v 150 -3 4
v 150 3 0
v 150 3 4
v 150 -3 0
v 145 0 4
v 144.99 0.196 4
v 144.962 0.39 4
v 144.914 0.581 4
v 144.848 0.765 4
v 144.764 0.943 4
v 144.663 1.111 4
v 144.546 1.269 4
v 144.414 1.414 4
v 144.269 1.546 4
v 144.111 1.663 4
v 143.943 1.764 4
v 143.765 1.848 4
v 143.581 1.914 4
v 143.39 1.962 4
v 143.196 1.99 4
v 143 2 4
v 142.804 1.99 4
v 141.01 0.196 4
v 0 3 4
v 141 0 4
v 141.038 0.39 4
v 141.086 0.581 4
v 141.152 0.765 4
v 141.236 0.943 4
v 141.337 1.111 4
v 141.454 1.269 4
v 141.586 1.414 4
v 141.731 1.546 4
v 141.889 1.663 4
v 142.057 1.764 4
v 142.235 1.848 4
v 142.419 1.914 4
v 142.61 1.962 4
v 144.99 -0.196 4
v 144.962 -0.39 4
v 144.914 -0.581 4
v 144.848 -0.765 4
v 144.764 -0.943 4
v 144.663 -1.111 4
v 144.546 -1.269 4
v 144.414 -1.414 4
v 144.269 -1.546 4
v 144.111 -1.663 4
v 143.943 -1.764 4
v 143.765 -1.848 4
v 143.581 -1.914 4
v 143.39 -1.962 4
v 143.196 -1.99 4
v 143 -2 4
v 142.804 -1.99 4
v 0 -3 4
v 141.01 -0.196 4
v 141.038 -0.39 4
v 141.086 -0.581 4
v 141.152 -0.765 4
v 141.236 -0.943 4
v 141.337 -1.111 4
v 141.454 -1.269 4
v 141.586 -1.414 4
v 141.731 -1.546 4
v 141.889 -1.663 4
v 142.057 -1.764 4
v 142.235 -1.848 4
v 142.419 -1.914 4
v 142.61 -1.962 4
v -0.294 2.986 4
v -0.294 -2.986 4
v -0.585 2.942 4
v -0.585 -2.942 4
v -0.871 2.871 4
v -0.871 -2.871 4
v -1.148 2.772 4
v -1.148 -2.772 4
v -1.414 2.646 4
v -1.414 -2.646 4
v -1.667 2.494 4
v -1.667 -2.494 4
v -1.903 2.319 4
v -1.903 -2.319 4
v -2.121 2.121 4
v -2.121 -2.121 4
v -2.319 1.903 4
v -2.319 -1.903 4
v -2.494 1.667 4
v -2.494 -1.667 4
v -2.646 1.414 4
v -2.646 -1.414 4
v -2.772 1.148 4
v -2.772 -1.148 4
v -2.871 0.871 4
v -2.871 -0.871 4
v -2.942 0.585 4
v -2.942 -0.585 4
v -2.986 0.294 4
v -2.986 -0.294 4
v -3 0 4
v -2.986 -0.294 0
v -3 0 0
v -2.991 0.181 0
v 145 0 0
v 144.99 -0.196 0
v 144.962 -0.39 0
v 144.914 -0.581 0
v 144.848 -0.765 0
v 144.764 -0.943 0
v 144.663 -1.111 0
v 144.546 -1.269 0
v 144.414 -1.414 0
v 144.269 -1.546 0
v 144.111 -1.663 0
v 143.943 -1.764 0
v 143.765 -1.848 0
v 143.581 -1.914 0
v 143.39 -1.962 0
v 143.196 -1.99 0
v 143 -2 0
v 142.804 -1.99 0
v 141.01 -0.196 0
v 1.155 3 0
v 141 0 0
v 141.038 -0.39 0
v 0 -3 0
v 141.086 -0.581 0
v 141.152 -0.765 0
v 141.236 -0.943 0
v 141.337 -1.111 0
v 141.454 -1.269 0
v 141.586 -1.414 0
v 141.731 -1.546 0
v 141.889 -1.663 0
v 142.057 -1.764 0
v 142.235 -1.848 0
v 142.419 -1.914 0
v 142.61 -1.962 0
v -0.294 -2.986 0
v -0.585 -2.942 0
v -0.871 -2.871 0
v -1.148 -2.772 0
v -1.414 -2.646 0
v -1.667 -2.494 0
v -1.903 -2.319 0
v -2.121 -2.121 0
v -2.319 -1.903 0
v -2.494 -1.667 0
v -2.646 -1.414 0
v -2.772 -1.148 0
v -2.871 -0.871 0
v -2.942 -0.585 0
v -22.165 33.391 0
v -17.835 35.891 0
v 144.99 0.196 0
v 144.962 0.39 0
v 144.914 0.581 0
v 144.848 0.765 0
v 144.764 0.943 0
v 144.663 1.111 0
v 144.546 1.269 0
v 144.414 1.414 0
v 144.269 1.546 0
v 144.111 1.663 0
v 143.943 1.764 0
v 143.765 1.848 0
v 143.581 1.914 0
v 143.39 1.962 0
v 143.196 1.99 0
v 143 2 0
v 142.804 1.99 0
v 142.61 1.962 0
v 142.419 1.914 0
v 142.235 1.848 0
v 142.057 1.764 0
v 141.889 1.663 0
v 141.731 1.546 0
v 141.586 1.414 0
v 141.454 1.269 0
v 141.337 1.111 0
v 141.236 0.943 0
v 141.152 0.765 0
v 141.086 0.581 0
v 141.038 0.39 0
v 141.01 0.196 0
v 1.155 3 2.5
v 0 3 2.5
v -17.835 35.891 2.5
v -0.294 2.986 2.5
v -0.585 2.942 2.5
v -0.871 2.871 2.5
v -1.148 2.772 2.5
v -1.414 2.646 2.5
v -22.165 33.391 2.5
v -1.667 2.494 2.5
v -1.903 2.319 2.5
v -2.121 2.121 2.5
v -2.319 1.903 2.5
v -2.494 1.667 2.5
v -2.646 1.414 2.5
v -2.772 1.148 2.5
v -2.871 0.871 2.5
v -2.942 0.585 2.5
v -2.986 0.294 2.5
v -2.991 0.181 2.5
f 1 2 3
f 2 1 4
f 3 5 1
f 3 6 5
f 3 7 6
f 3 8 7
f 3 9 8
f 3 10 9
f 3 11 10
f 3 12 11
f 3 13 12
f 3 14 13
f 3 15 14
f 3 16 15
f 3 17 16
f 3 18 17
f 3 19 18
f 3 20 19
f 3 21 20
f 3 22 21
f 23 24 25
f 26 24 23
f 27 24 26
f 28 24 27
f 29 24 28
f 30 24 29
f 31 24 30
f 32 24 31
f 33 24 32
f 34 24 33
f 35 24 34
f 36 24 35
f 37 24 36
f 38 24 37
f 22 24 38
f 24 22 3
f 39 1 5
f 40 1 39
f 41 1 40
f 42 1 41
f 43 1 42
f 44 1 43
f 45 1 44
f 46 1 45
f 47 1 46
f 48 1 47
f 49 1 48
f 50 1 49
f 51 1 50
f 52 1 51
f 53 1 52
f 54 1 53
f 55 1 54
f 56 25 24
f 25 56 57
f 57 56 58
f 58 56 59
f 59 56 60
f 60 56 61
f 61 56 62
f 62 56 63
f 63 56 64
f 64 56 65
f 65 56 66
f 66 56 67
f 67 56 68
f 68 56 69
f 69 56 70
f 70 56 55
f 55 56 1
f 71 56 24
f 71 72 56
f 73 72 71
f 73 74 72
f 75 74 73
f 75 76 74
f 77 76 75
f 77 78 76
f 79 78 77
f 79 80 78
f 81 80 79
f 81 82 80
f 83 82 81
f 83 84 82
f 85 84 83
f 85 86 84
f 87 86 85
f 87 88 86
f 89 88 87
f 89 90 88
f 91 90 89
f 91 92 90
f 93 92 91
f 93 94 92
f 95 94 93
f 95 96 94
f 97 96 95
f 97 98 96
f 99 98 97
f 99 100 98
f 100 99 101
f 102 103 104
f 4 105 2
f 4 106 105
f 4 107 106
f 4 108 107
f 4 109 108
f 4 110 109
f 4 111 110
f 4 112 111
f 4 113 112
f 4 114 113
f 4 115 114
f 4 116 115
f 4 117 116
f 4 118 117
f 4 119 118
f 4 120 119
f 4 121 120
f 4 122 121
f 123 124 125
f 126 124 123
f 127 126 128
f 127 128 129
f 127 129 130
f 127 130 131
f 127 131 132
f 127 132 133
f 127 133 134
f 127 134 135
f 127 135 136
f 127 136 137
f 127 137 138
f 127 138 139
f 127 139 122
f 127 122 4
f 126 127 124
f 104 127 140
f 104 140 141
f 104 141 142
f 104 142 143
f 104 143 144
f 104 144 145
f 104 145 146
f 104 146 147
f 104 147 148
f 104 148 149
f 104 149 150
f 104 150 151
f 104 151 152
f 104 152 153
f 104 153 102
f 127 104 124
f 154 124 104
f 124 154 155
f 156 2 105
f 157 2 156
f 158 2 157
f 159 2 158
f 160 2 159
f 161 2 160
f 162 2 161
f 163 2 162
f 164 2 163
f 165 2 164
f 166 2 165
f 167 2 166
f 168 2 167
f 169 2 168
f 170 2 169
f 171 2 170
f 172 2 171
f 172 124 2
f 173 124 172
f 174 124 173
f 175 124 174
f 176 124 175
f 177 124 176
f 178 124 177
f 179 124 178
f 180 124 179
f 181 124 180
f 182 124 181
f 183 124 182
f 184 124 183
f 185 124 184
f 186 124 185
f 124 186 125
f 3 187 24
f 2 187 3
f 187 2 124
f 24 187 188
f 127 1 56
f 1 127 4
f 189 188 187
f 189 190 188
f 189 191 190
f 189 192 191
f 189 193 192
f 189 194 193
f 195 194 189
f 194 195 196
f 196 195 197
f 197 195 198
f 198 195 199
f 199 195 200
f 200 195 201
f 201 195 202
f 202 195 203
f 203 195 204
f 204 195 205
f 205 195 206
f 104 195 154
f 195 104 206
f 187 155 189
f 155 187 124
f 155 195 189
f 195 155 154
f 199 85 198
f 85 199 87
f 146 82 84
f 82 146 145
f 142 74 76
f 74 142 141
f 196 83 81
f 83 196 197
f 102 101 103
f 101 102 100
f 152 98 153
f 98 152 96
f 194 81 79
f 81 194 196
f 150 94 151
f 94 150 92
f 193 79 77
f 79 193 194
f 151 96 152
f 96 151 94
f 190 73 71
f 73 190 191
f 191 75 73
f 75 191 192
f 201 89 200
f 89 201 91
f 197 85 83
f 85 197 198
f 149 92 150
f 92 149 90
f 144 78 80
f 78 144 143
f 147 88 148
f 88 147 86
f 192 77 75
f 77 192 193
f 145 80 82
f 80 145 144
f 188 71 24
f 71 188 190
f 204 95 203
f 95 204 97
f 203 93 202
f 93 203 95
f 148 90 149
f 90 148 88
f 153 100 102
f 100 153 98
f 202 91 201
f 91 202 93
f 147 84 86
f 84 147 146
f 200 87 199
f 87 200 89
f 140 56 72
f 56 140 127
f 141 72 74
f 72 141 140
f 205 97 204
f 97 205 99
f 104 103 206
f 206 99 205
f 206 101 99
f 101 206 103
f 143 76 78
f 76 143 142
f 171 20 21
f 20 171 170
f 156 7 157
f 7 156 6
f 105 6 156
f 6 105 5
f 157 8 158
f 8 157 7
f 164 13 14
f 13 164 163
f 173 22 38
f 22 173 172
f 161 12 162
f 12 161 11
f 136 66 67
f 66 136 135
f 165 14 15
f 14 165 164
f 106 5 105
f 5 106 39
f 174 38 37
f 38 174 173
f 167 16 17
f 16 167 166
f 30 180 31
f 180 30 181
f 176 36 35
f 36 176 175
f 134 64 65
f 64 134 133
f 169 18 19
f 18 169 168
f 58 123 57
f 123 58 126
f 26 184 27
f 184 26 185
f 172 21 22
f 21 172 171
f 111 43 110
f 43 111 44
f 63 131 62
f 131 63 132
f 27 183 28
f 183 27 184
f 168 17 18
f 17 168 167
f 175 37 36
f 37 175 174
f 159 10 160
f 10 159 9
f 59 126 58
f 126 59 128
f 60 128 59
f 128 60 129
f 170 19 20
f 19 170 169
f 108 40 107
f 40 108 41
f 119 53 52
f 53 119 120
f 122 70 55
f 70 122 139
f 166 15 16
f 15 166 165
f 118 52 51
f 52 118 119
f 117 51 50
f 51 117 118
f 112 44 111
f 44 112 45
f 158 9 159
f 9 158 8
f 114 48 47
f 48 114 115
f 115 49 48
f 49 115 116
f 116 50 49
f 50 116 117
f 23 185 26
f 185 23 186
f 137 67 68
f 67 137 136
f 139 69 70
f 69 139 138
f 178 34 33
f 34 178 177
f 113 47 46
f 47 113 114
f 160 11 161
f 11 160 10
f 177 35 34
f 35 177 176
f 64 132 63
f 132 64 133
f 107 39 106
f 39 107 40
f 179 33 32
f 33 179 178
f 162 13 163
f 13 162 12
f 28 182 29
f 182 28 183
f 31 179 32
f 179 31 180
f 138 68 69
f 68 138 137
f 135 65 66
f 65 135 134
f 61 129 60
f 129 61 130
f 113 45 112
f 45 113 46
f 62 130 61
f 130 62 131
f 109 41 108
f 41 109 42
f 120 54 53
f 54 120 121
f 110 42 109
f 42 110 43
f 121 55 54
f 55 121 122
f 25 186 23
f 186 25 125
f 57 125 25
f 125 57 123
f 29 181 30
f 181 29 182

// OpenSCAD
// Handle dimensions (mm)
handle_length = 150;
handle_width = 6;
handle_thickness = 4;

// Spreading foot dimensions (mm)
foot_length = 40;
foot_width = 5;
foot_thickness = 2.5;

// Boss dimensions (mm)
boss_diameter = 6;
boss_height = 4;

// Hole dimensions (mm)
hole_diameter = 4;
hole_x = 143;

// Foot angle (degrees, counter-clockwise from +X axis)
foot_angle = 120;

$fn = 64;

// Main body - union of handle, foot, and boss
difference() {
  union() {
    // Handle: x = 0 to 150, y = -3 to 3, z = 0 to 4
    translate([0, -handle_width/2, 0]) {
      cube([handle_length, handle_width, handle_thickness]);
    }
    
    // Spreading foot: 40 mm long, 5 mm wide, 2.5 mm thick, at 120 degrees
    // Rotate first, then translate - so centerline passes through origin at 120°
    rotate([0, 0, foot_angle]) {
      translate([0, -foot_width/2, 0]) {
        cube([foot_length, foot_width, foot_thickness]);
      }
    }
    
    // Round boss at origin: 6 mm diameter, 4 mm tall
    cylinder(d=boss_diameter, h=boss_height);
  }
  
  // Subtract hanging hole at x = 143, y = 0
  translate([hole_x, 0, -0.5]) {
    cylinder(d=hole_diameter, h=handle_thickness + 1);
  }
}
